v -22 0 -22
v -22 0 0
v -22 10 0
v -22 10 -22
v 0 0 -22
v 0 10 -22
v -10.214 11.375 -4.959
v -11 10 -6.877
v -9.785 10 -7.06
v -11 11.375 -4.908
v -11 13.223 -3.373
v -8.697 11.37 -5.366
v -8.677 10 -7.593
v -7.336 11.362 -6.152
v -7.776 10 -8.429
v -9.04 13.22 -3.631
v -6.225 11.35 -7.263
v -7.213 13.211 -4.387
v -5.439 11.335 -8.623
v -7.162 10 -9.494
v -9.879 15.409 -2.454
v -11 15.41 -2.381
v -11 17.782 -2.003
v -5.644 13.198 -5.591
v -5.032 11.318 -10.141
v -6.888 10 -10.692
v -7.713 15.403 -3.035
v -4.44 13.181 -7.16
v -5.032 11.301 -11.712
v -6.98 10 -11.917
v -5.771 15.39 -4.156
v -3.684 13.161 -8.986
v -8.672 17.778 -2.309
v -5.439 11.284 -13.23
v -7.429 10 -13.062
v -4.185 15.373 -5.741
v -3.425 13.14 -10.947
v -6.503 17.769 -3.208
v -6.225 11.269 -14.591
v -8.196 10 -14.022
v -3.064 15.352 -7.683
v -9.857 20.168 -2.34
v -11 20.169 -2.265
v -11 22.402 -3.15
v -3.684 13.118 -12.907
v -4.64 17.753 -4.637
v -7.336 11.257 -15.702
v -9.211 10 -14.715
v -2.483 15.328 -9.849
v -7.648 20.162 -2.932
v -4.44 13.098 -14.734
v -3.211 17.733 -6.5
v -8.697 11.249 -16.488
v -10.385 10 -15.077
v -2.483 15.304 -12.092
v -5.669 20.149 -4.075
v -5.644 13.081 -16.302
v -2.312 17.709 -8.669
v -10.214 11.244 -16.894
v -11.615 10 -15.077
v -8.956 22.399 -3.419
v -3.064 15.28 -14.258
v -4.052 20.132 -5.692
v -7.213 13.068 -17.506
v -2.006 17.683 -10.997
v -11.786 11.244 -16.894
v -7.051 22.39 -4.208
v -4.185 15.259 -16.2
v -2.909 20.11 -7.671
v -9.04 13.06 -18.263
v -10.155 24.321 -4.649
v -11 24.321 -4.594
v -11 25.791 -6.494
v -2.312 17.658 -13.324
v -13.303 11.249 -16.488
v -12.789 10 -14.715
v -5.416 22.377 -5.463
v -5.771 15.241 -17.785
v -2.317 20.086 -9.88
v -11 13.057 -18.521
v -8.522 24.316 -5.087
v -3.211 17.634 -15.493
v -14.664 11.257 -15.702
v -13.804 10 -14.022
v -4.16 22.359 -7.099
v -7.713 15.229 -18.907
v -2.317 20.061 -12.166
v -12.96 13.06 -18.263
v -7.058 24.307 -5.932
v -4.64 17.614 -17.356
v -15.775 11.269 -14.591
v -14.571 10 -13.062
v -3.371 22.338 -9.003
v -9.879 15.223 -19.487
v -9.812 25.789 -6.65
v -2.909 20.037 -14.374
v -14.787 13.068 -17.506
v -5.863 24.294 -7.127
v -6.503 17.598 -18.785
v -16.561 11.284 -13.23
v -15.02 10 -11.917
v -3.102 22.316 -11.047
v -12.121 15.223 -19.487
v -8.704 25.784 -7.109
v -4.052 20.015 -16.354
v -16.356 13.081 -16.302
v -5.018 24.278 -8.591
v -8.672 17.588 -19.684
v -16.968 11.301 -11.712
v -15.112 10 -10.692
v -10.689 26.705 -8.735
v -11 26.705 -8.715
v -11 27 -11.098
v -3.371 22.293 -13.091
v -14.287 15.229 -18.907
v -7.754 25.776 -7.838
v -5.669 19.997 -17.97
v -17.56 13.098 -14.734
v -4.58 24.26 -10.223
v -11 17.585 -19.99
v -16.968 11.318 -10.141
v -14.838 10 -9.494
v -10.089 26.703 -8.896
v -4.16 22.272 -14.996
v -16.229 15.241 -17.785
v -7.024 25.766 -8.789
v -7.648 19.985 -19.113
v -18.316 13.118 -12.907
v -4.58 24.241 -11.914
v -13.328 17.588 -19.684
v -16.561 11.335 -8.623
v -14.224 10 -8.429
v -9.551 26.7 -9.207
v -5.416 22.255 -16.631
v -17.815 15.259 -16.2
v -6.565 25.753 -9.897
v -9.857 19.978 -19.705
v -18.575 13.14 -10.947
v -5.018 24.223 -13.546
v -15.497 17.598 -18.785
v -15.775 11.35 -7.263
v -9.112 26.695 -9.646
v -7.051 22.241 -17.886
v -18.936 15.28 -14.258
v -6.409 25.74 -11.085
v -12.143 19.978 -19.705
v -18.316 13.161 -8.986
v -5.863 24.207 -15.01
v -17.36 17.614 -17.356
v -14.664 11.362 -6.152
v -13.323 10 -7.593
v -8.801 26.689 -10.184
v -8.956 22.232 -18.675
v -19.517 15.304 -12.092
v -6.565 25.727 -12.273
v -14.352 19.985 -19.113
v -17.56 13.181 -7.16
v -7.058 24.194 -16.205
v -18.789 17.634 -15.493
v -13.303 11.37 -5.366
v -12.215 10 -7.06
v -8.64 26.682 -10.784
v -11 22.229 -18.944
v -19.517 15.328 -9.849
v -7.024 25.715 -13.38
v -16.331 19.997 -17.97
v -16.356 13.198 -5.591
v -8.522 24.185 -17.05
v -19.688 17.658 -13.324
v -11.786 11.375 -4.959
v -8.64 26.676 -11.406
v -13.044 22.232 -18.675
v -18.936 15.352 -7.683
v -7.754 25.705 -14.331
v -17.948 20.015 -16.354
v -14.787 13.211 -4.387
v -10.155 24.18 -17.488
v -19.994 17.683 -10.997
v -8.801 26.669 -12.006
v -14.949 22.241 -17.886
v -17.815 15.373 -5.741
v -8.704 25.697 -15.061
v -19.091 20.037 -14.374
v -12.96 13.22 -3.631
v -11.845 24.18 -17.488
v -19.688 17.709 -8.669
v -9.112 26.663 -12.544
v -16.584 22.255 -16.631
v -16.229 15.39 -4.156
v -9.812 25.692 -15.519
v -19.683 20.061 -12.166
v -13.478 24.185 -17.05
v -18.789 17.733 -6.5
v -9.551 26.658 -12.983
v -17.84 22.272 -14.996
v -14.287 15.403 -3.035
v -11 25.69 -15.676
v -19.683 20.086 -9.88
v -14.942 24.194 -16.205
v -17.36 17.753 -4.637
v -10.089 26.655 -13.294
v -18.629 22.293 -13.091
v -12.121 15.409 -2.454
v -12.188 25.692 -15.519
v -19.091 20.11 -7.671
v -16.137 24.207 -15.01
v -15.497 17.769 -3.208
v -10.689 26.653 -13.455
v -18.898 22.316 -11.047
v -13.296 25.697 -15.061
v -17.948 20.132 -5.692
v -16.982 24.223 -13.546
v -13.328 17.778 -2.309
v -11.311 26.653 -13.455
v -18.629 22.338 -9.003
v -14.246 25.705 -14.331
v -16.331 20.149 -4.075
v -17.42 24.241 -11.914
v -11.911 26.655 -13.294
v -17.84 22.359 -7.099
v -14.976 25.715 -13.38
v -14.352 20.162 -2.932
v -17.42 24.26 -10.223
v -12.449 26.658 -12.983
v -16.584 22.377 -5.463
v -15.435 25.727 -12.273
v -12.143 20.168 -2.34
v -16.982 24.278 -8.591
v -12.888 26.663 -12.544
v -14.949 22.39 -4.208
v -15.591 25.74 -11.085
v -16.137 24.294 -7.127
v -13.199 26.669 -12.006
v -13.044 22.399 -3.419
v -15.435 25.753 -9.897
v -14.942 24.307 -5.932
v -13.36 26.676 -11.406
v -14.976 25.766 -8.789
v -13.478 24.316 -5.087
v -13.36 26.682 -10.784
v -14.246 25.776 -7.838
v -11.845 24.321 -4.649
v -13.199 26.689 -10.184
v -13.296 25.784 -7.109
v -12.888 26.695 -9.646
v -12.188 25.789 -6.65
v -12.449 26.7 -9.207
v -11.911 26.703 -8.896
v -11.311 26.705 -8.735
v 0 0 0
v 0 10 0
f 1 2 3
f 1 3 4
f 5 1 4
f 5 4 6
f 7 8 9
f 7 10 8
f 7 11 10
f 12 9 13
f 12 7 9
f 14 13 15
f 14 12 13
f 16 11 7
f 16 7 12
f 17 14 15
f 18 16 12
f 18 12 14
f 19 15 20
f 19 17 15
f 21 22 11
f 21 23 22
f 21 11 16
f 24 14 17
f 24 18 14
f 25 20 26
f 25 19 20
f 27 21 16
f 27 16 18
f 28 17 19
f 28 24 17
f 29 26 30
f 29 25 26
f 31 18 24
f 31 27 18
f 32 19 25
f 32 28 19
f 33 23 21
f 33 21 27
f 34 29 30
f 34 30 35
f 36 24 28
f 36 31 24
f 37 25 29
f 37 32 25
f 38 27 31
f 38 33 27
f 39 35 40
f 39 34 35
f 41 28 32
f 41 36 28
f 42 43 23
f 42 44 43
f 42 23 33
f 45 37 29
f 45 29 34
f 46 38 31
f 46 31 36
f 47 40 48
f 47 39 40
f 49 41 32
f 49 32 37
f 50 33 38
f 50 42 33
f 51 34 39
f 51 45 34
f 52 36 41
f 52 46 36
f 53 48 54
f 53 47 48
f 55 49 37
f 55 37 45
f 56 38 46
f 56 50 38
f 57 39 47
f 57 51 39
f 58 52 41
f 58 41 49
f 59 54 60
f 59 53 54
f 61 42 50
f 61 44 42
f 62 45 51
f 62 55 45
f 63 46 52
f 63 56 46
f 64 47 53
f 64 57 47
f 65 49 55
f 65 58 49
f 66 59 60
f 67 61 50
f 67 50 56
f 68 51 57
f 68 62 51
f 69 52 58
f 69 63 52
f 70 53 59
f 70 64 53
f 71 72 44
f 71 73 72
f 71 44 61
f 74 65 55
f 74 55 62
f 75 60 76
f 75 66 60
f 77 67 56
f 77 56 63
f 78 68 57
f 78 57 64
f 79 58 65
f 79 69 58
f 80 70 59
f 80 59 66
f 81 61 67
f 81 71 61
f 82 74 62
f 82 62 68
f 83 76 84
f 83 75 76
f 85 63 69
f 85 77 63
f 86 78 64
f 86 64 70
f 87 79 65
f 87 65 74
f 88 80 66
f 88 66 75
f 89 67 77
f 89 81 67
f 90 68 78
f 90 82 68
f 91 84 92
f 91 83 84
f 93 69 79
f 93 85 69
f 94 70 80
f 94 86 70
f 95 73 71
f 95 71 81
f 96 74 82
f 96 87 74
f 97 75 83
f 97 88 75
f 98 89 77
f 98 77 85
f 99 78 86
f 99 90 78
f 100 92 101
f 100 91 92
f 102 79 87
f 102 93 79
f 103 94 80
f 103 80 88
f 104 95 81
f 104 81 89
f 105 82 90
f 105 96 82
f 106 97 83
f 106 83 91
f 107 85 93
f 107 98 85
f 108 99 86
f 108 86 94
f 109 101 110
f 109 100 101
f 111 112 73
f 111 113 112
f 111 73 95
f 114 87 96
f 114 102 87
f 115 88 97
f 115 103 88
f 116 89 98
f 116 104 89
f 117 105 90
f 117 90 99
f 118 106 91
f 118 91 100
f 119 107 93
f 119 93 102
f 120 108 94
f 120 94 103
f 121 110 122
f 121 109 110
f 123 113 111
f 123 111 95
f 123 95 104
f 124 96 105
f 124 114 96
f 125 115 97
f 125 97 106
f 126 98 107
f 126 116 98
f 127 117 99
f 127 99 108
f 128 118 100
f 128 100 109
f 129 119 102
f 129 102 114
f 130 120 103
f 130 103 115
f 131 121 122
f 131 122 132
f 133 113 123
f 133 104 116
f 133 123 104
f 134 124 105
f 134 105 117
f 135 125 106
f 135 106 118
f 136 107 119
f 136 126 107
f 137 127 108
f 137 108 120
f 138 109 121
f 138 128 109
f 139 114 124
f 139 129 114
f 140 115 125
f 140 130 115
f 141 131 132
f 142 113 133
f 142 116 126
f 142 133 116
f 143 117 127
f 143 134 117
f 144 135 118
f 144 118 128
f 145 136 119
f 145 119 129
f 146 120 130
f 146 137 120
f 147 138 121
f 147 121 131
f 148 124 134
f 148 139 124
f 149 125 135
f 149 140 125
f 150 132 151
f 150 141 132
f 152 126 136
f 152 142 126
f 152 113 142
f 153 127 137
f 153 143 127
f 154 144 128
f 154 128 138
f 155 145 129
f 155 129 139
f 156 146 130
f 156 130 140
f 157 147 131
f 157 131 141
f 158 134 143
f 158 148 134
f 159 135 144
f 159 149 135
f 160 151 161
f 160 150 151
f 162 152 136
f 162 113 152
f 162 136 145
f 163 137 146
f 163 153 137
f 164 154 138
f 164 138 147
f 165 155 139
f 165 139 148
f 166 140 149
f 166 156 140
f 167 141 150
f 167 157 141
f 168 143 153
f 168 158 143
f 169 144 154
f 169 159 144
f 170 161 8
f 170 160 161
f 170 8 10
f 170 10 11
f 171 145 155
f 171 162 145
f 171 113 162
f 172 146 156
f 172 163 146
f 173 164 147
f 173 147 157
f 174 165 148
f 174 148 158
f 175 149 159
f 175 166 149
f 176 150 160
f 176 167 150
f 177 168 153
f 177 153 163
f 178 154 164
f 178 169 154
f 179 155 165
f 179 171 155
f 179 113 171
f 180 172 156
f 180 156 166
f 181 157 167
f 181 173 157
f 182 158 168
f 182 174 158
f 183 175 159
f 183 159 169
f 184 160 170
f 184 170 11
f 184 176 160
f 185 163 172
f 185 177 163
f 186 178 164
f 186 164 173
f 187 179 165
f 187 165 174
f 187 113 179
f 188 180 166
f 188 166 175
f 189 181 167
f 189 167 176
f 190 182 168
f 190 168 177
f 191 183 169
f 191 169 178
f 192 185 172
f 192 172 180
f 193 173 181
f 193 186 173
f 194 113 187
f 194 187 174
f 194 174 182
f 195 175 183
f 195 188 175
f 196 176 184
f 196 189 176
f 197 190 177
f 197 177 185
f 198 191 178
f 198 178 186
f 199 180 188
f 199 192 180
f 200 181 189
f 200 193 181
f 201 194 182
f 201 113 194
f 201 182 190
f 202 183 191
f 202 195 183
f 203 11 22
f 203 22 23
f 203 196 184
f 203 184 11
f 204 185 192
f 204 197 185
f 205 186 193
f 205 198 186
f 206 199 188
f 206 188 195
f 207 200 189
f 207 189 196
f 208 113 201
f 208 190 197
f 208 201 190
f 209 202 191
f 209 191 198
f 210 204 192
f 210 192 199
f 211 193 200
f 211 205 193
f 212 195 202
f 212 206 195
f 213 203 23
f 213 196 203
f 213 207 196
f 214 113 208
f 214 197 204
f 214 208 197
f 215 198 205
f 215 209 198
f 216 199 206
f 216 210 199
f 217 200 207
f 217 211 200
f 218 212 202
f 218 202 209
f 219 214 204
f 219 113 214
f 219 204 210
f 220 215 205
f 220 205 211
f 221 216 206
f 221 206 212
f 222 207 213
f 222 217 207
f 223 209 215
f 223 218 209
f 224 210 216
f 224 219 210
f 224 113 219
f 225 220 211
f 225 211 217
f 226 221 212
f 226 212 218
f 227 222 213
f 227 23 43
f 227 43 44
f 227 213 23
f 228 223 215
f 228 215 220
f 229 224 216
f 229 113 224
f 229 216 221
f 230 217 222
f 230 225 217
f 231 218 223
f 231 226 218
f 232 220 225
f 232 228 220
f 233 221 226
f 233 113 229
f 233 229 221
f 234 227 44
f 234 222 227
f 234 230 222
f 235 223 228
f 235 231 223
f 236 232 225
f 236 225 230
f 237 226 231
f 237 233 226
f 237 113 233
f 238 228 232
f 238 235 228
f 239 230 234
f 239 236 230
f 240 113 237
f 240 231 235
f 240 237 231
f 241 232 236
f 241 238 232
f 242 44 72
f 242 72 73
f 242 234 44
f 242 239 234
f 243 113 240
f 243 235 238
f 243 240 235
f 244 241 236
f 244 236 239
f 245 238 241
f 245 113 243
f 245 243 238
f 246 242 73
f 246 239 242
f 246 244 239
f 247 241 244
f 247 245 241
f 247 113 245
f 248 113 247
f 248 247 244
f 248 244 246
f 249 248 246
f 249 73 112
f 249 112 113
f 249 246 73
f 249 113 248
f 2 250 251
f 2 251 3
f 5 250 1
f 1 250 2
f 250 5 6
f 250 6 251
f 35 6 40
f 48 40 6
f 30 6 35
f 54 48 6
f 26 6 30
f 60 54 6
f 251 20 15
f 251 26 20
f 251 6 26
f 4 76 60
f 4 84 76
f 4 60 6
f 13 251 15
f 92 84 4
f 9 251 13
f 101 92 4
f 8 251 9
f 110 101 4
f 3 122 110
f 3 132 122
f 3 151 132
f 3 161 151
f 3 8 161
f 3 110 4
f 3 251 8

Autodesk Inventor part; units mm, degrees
ref_plane "YZ Plane" through (0, 0, 0) normal (1, 0, 0) x (0, 1, 0)
ref_plane "XZ Plane" through (0, 0, 0) normal (0, 1, 0) x (-1, 0, 0)
ref_plane "XY Plane" through (0, 0, 0) normal (0, 0, 1) x (1, 0, 0)
sketch "Sketch6" plane through (0, 0, 0) normal (0, 1, 0) x (-1, 0, 0)
  line L0 (0, 0) -> (22, 0)
  line L1 (22, 0) -> (22, -22)
  line L2 (22, -22) -> (0, -22)
  line L3 (0, -22) -> (0, 0)
  dimension "d18" = 22
  dimension "d19" = 22
extrude "Extrusion3" add sketch "Sketch6" along normal blind 10
ref_plane "Work Plane1" through (-11, 0, -22) normal (-1, 0, 0) x (0, 0, 1)
sketch "Sketch8" plane through (-11, 0, -22) normal (-1, 0, 0) x (0, 0, 1)
  line L0 (0, 10) -> (22, 10) projected
  line L1 (11, 10) -> (11, 18)
  circle A0 centre (11, 18) radius 9
  line L2 (11.0985, 9.0005) -> (10.9015, 26.9995)
  point P0 (22, 0)
  dimension "d30" = 8
  dimension "d31" = 18
revolve "Revolution2" add sketch "Sketch8" angle 360 about axis through (-11, 9.0005, -10.9015) along (0, 0.9999401, -0.0109435) picked at (12.4036, 12.6667) picked at (13.3498, 9.8198) contours A0 L0 L2 | L2 L0 A0
properties part number "sphere-test"
